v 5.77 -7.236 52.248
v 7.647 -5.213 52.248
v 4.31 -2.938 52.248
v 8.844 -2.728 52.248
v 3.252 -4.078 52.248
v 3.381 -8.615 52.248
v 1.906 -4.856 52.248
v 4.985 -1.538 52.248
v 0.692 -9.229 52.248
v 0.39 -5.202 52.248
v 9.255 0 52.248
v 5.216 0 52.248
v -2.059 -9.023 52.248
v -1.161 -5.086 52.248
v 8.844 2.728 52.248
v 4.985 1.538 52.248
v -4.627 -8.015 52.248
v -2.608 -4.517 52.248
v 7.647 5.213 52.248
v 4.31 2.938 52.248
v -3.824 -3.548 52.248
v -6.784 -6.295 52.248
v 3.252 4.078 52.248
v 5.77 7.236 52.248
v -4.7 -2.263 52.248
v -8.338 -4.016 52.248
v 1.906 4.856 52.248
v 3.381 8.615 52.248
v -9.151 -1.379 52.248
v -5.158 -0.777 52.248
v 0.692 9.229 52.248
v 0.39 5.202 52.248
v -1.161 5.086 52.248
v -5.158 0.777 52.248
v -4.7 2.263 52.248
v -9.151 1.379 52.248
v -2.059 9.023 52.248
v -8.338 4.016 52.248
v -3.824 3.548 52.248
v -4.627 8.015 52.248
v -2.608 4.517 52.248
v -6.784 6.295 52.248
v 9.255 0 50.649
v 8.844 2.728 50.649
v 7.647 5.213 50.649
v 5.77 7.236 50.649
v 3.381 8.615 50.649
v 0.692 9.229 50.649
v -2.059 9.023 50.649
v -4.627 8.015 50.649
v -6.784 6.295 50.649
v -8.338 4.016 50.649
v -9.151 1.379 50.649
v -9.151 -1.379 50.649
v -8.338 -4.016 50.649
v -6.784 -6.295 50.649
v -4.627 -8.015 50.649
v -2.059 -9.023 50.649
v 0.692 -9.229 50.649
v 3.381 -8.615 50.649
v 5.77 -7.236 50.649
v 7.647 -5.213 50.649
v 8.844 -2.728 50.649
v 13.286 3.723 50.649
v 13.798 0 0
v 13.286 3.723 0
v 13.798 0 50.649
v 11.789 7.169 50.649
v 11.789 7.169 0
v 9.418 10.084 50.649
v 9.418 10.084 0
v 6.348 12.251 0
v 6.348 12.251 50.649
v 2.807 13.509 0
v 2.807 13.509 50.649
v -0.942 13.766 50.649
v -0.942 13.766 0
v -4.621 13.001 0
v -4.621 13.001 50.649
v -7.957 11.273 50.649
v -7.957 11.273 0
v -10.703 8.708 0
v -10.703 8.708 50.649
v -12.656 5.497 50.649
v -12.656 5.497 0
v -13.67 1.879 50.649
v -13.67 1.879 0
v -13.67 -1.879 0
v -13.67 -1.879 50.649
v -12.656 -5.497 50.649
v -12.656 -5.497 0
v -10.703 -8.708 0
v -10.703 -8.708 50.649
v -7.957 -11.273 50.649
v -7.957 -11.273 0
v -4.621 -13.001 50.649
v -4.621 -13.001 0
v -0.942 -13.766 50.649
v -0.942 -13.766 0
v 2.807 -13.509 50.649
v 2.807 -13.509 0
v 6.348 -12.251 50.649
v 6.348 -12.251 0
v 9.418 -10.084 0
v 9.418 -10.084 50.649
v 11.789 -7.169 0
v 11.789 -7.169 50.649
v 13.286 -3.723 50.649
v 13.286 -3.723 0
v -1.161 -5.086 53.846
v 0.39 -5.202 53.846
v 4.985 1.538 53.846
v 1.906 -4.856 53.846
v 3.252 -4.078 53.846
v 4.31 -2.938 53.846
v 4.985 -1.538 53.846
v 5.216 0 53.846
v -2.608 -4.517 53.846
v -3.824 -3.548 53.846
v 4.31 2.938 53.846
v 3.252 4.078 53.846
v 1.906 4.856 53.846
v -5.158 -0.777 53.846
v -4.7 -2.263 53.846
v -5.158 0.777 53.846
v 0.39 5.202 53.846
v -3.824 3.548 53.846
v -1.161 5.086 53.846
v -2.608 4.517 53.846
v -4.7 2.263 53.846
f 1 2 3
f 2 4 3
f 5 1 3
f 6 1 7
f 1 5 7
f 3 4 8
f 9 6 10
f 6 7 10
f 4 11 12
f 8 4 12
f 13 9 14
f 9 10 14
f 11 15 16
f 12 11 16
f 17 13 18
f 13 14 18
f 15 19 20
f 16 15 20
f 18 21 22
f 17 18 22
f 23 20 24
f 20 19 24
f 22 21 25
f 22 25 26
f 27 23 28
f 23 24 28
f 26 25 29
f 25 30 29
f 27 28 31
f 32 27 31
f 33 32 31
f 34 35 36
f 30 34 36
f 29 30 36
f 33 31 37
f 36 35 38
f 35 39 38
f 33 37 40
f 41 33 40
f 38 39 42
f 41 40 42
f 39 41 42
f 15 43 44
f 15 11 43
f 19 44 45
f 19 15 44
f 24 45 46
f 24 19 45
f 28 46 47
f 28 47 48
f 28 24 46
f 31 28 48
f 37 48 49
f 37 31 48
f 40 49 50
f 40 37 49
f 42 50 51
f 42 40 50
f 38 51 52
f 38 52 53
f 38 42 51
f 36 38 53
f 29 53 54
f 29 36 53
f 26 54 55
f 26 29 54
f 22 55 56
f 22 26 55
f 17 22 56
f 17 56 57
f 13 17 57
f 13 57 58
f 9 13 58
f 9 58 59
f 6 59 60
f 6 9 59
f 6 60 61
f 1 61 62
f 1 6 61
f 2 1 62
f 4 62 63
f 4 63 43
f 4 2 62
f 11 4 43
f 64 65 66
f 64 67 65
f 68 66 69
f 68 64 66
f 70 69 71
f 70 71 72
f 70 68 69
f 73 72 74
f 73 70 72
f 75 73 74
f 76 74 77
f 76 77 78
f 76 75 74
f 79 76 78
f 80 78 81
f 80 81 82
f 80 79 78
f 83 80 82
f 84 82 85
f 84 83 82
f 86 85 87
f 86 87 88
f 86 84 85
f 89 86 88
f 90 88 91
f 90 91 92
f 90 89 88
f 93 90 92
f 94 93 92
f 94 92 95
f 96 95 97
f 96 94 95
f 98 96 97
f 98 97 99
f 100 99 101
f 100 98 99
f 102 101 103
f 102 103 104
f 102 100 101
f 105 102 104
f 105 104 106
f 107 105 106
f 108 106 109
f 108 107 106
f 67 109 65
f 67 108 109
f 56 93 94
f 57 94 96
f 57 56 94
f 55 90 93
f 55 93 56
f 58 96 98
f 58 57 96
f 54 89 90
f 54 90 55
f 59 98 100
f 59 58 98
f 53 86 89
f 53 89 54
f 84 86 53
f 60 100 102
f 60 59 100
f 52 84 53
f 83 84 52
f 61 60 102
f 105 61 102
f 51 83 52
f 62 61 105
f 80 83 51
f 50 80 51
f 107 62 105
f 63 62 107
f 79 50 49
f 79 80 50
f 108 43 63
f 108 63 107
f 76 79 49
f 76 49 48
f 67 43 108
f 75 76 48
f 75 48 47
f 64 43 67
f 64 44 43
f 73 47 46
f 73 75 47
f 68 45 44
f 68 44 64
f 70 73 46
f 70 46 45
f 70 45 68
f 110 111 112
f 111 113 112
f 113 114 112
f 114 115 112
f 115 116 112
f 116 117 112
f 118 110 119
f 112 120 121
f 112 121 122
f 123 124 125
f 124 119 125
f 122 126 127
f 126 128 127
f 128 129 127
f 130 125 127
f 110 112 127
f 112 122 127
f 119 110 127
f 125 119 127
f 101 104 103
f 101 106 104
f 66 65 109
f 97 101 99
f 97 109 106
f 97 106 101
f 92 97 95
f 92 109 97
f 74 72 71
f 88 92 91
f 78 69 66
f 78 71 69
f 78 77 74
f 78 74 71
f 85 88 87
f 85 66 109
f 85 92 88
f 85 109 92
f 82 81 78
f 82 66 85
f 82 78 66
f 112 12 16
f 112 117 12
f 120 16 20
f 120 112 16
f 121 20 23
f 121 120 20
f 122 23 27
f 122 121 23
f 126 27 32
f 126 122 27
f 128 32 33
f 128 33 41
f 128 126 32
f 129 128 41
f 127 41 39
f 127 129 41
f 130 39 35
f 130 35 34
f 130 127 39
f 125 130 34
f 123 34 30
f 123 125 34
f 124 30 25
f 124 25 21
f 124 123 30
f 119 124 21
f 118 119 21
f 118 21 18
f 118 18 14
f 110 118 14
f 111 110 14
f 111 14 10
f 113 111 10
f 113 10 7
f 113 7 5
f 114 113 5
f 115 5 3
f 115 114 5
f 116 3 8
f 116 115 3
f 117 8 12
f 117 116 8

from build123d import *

# Parameters (mm, degrees)
F0_W   = 5.2163470536
F0_H   = 1.59855932
F0_W_2 = 4.0384605527


with BuildPart() as f1:
    # F0 (on Front) → F1 (revolve)
    with BuildSketch(Plane.XZ):
        with Locations((2.6081735268, 53.0468784273)):
            Rectangle(F0_W, F0_H)
        Polygon((0, 50.6490394473), (0, 0), (13.7980775908, 0), (13.7980775908, 50.6490394473), (9.2548076063, 50.6490394473), (5.2163470536, 50.6490394473), align=None)
        with Locations((7.23557733, 51.4483191073)):
            Rectangle(F0_W_2, F0_H)
        with Locations((2.6081735268, 51.4483191073)):
            Rectangle(F0_W, F0_H)
    revolve(axis=Axis((0, 0, 25.3245197237), (0, 0, 1)))


solid = f1.part
